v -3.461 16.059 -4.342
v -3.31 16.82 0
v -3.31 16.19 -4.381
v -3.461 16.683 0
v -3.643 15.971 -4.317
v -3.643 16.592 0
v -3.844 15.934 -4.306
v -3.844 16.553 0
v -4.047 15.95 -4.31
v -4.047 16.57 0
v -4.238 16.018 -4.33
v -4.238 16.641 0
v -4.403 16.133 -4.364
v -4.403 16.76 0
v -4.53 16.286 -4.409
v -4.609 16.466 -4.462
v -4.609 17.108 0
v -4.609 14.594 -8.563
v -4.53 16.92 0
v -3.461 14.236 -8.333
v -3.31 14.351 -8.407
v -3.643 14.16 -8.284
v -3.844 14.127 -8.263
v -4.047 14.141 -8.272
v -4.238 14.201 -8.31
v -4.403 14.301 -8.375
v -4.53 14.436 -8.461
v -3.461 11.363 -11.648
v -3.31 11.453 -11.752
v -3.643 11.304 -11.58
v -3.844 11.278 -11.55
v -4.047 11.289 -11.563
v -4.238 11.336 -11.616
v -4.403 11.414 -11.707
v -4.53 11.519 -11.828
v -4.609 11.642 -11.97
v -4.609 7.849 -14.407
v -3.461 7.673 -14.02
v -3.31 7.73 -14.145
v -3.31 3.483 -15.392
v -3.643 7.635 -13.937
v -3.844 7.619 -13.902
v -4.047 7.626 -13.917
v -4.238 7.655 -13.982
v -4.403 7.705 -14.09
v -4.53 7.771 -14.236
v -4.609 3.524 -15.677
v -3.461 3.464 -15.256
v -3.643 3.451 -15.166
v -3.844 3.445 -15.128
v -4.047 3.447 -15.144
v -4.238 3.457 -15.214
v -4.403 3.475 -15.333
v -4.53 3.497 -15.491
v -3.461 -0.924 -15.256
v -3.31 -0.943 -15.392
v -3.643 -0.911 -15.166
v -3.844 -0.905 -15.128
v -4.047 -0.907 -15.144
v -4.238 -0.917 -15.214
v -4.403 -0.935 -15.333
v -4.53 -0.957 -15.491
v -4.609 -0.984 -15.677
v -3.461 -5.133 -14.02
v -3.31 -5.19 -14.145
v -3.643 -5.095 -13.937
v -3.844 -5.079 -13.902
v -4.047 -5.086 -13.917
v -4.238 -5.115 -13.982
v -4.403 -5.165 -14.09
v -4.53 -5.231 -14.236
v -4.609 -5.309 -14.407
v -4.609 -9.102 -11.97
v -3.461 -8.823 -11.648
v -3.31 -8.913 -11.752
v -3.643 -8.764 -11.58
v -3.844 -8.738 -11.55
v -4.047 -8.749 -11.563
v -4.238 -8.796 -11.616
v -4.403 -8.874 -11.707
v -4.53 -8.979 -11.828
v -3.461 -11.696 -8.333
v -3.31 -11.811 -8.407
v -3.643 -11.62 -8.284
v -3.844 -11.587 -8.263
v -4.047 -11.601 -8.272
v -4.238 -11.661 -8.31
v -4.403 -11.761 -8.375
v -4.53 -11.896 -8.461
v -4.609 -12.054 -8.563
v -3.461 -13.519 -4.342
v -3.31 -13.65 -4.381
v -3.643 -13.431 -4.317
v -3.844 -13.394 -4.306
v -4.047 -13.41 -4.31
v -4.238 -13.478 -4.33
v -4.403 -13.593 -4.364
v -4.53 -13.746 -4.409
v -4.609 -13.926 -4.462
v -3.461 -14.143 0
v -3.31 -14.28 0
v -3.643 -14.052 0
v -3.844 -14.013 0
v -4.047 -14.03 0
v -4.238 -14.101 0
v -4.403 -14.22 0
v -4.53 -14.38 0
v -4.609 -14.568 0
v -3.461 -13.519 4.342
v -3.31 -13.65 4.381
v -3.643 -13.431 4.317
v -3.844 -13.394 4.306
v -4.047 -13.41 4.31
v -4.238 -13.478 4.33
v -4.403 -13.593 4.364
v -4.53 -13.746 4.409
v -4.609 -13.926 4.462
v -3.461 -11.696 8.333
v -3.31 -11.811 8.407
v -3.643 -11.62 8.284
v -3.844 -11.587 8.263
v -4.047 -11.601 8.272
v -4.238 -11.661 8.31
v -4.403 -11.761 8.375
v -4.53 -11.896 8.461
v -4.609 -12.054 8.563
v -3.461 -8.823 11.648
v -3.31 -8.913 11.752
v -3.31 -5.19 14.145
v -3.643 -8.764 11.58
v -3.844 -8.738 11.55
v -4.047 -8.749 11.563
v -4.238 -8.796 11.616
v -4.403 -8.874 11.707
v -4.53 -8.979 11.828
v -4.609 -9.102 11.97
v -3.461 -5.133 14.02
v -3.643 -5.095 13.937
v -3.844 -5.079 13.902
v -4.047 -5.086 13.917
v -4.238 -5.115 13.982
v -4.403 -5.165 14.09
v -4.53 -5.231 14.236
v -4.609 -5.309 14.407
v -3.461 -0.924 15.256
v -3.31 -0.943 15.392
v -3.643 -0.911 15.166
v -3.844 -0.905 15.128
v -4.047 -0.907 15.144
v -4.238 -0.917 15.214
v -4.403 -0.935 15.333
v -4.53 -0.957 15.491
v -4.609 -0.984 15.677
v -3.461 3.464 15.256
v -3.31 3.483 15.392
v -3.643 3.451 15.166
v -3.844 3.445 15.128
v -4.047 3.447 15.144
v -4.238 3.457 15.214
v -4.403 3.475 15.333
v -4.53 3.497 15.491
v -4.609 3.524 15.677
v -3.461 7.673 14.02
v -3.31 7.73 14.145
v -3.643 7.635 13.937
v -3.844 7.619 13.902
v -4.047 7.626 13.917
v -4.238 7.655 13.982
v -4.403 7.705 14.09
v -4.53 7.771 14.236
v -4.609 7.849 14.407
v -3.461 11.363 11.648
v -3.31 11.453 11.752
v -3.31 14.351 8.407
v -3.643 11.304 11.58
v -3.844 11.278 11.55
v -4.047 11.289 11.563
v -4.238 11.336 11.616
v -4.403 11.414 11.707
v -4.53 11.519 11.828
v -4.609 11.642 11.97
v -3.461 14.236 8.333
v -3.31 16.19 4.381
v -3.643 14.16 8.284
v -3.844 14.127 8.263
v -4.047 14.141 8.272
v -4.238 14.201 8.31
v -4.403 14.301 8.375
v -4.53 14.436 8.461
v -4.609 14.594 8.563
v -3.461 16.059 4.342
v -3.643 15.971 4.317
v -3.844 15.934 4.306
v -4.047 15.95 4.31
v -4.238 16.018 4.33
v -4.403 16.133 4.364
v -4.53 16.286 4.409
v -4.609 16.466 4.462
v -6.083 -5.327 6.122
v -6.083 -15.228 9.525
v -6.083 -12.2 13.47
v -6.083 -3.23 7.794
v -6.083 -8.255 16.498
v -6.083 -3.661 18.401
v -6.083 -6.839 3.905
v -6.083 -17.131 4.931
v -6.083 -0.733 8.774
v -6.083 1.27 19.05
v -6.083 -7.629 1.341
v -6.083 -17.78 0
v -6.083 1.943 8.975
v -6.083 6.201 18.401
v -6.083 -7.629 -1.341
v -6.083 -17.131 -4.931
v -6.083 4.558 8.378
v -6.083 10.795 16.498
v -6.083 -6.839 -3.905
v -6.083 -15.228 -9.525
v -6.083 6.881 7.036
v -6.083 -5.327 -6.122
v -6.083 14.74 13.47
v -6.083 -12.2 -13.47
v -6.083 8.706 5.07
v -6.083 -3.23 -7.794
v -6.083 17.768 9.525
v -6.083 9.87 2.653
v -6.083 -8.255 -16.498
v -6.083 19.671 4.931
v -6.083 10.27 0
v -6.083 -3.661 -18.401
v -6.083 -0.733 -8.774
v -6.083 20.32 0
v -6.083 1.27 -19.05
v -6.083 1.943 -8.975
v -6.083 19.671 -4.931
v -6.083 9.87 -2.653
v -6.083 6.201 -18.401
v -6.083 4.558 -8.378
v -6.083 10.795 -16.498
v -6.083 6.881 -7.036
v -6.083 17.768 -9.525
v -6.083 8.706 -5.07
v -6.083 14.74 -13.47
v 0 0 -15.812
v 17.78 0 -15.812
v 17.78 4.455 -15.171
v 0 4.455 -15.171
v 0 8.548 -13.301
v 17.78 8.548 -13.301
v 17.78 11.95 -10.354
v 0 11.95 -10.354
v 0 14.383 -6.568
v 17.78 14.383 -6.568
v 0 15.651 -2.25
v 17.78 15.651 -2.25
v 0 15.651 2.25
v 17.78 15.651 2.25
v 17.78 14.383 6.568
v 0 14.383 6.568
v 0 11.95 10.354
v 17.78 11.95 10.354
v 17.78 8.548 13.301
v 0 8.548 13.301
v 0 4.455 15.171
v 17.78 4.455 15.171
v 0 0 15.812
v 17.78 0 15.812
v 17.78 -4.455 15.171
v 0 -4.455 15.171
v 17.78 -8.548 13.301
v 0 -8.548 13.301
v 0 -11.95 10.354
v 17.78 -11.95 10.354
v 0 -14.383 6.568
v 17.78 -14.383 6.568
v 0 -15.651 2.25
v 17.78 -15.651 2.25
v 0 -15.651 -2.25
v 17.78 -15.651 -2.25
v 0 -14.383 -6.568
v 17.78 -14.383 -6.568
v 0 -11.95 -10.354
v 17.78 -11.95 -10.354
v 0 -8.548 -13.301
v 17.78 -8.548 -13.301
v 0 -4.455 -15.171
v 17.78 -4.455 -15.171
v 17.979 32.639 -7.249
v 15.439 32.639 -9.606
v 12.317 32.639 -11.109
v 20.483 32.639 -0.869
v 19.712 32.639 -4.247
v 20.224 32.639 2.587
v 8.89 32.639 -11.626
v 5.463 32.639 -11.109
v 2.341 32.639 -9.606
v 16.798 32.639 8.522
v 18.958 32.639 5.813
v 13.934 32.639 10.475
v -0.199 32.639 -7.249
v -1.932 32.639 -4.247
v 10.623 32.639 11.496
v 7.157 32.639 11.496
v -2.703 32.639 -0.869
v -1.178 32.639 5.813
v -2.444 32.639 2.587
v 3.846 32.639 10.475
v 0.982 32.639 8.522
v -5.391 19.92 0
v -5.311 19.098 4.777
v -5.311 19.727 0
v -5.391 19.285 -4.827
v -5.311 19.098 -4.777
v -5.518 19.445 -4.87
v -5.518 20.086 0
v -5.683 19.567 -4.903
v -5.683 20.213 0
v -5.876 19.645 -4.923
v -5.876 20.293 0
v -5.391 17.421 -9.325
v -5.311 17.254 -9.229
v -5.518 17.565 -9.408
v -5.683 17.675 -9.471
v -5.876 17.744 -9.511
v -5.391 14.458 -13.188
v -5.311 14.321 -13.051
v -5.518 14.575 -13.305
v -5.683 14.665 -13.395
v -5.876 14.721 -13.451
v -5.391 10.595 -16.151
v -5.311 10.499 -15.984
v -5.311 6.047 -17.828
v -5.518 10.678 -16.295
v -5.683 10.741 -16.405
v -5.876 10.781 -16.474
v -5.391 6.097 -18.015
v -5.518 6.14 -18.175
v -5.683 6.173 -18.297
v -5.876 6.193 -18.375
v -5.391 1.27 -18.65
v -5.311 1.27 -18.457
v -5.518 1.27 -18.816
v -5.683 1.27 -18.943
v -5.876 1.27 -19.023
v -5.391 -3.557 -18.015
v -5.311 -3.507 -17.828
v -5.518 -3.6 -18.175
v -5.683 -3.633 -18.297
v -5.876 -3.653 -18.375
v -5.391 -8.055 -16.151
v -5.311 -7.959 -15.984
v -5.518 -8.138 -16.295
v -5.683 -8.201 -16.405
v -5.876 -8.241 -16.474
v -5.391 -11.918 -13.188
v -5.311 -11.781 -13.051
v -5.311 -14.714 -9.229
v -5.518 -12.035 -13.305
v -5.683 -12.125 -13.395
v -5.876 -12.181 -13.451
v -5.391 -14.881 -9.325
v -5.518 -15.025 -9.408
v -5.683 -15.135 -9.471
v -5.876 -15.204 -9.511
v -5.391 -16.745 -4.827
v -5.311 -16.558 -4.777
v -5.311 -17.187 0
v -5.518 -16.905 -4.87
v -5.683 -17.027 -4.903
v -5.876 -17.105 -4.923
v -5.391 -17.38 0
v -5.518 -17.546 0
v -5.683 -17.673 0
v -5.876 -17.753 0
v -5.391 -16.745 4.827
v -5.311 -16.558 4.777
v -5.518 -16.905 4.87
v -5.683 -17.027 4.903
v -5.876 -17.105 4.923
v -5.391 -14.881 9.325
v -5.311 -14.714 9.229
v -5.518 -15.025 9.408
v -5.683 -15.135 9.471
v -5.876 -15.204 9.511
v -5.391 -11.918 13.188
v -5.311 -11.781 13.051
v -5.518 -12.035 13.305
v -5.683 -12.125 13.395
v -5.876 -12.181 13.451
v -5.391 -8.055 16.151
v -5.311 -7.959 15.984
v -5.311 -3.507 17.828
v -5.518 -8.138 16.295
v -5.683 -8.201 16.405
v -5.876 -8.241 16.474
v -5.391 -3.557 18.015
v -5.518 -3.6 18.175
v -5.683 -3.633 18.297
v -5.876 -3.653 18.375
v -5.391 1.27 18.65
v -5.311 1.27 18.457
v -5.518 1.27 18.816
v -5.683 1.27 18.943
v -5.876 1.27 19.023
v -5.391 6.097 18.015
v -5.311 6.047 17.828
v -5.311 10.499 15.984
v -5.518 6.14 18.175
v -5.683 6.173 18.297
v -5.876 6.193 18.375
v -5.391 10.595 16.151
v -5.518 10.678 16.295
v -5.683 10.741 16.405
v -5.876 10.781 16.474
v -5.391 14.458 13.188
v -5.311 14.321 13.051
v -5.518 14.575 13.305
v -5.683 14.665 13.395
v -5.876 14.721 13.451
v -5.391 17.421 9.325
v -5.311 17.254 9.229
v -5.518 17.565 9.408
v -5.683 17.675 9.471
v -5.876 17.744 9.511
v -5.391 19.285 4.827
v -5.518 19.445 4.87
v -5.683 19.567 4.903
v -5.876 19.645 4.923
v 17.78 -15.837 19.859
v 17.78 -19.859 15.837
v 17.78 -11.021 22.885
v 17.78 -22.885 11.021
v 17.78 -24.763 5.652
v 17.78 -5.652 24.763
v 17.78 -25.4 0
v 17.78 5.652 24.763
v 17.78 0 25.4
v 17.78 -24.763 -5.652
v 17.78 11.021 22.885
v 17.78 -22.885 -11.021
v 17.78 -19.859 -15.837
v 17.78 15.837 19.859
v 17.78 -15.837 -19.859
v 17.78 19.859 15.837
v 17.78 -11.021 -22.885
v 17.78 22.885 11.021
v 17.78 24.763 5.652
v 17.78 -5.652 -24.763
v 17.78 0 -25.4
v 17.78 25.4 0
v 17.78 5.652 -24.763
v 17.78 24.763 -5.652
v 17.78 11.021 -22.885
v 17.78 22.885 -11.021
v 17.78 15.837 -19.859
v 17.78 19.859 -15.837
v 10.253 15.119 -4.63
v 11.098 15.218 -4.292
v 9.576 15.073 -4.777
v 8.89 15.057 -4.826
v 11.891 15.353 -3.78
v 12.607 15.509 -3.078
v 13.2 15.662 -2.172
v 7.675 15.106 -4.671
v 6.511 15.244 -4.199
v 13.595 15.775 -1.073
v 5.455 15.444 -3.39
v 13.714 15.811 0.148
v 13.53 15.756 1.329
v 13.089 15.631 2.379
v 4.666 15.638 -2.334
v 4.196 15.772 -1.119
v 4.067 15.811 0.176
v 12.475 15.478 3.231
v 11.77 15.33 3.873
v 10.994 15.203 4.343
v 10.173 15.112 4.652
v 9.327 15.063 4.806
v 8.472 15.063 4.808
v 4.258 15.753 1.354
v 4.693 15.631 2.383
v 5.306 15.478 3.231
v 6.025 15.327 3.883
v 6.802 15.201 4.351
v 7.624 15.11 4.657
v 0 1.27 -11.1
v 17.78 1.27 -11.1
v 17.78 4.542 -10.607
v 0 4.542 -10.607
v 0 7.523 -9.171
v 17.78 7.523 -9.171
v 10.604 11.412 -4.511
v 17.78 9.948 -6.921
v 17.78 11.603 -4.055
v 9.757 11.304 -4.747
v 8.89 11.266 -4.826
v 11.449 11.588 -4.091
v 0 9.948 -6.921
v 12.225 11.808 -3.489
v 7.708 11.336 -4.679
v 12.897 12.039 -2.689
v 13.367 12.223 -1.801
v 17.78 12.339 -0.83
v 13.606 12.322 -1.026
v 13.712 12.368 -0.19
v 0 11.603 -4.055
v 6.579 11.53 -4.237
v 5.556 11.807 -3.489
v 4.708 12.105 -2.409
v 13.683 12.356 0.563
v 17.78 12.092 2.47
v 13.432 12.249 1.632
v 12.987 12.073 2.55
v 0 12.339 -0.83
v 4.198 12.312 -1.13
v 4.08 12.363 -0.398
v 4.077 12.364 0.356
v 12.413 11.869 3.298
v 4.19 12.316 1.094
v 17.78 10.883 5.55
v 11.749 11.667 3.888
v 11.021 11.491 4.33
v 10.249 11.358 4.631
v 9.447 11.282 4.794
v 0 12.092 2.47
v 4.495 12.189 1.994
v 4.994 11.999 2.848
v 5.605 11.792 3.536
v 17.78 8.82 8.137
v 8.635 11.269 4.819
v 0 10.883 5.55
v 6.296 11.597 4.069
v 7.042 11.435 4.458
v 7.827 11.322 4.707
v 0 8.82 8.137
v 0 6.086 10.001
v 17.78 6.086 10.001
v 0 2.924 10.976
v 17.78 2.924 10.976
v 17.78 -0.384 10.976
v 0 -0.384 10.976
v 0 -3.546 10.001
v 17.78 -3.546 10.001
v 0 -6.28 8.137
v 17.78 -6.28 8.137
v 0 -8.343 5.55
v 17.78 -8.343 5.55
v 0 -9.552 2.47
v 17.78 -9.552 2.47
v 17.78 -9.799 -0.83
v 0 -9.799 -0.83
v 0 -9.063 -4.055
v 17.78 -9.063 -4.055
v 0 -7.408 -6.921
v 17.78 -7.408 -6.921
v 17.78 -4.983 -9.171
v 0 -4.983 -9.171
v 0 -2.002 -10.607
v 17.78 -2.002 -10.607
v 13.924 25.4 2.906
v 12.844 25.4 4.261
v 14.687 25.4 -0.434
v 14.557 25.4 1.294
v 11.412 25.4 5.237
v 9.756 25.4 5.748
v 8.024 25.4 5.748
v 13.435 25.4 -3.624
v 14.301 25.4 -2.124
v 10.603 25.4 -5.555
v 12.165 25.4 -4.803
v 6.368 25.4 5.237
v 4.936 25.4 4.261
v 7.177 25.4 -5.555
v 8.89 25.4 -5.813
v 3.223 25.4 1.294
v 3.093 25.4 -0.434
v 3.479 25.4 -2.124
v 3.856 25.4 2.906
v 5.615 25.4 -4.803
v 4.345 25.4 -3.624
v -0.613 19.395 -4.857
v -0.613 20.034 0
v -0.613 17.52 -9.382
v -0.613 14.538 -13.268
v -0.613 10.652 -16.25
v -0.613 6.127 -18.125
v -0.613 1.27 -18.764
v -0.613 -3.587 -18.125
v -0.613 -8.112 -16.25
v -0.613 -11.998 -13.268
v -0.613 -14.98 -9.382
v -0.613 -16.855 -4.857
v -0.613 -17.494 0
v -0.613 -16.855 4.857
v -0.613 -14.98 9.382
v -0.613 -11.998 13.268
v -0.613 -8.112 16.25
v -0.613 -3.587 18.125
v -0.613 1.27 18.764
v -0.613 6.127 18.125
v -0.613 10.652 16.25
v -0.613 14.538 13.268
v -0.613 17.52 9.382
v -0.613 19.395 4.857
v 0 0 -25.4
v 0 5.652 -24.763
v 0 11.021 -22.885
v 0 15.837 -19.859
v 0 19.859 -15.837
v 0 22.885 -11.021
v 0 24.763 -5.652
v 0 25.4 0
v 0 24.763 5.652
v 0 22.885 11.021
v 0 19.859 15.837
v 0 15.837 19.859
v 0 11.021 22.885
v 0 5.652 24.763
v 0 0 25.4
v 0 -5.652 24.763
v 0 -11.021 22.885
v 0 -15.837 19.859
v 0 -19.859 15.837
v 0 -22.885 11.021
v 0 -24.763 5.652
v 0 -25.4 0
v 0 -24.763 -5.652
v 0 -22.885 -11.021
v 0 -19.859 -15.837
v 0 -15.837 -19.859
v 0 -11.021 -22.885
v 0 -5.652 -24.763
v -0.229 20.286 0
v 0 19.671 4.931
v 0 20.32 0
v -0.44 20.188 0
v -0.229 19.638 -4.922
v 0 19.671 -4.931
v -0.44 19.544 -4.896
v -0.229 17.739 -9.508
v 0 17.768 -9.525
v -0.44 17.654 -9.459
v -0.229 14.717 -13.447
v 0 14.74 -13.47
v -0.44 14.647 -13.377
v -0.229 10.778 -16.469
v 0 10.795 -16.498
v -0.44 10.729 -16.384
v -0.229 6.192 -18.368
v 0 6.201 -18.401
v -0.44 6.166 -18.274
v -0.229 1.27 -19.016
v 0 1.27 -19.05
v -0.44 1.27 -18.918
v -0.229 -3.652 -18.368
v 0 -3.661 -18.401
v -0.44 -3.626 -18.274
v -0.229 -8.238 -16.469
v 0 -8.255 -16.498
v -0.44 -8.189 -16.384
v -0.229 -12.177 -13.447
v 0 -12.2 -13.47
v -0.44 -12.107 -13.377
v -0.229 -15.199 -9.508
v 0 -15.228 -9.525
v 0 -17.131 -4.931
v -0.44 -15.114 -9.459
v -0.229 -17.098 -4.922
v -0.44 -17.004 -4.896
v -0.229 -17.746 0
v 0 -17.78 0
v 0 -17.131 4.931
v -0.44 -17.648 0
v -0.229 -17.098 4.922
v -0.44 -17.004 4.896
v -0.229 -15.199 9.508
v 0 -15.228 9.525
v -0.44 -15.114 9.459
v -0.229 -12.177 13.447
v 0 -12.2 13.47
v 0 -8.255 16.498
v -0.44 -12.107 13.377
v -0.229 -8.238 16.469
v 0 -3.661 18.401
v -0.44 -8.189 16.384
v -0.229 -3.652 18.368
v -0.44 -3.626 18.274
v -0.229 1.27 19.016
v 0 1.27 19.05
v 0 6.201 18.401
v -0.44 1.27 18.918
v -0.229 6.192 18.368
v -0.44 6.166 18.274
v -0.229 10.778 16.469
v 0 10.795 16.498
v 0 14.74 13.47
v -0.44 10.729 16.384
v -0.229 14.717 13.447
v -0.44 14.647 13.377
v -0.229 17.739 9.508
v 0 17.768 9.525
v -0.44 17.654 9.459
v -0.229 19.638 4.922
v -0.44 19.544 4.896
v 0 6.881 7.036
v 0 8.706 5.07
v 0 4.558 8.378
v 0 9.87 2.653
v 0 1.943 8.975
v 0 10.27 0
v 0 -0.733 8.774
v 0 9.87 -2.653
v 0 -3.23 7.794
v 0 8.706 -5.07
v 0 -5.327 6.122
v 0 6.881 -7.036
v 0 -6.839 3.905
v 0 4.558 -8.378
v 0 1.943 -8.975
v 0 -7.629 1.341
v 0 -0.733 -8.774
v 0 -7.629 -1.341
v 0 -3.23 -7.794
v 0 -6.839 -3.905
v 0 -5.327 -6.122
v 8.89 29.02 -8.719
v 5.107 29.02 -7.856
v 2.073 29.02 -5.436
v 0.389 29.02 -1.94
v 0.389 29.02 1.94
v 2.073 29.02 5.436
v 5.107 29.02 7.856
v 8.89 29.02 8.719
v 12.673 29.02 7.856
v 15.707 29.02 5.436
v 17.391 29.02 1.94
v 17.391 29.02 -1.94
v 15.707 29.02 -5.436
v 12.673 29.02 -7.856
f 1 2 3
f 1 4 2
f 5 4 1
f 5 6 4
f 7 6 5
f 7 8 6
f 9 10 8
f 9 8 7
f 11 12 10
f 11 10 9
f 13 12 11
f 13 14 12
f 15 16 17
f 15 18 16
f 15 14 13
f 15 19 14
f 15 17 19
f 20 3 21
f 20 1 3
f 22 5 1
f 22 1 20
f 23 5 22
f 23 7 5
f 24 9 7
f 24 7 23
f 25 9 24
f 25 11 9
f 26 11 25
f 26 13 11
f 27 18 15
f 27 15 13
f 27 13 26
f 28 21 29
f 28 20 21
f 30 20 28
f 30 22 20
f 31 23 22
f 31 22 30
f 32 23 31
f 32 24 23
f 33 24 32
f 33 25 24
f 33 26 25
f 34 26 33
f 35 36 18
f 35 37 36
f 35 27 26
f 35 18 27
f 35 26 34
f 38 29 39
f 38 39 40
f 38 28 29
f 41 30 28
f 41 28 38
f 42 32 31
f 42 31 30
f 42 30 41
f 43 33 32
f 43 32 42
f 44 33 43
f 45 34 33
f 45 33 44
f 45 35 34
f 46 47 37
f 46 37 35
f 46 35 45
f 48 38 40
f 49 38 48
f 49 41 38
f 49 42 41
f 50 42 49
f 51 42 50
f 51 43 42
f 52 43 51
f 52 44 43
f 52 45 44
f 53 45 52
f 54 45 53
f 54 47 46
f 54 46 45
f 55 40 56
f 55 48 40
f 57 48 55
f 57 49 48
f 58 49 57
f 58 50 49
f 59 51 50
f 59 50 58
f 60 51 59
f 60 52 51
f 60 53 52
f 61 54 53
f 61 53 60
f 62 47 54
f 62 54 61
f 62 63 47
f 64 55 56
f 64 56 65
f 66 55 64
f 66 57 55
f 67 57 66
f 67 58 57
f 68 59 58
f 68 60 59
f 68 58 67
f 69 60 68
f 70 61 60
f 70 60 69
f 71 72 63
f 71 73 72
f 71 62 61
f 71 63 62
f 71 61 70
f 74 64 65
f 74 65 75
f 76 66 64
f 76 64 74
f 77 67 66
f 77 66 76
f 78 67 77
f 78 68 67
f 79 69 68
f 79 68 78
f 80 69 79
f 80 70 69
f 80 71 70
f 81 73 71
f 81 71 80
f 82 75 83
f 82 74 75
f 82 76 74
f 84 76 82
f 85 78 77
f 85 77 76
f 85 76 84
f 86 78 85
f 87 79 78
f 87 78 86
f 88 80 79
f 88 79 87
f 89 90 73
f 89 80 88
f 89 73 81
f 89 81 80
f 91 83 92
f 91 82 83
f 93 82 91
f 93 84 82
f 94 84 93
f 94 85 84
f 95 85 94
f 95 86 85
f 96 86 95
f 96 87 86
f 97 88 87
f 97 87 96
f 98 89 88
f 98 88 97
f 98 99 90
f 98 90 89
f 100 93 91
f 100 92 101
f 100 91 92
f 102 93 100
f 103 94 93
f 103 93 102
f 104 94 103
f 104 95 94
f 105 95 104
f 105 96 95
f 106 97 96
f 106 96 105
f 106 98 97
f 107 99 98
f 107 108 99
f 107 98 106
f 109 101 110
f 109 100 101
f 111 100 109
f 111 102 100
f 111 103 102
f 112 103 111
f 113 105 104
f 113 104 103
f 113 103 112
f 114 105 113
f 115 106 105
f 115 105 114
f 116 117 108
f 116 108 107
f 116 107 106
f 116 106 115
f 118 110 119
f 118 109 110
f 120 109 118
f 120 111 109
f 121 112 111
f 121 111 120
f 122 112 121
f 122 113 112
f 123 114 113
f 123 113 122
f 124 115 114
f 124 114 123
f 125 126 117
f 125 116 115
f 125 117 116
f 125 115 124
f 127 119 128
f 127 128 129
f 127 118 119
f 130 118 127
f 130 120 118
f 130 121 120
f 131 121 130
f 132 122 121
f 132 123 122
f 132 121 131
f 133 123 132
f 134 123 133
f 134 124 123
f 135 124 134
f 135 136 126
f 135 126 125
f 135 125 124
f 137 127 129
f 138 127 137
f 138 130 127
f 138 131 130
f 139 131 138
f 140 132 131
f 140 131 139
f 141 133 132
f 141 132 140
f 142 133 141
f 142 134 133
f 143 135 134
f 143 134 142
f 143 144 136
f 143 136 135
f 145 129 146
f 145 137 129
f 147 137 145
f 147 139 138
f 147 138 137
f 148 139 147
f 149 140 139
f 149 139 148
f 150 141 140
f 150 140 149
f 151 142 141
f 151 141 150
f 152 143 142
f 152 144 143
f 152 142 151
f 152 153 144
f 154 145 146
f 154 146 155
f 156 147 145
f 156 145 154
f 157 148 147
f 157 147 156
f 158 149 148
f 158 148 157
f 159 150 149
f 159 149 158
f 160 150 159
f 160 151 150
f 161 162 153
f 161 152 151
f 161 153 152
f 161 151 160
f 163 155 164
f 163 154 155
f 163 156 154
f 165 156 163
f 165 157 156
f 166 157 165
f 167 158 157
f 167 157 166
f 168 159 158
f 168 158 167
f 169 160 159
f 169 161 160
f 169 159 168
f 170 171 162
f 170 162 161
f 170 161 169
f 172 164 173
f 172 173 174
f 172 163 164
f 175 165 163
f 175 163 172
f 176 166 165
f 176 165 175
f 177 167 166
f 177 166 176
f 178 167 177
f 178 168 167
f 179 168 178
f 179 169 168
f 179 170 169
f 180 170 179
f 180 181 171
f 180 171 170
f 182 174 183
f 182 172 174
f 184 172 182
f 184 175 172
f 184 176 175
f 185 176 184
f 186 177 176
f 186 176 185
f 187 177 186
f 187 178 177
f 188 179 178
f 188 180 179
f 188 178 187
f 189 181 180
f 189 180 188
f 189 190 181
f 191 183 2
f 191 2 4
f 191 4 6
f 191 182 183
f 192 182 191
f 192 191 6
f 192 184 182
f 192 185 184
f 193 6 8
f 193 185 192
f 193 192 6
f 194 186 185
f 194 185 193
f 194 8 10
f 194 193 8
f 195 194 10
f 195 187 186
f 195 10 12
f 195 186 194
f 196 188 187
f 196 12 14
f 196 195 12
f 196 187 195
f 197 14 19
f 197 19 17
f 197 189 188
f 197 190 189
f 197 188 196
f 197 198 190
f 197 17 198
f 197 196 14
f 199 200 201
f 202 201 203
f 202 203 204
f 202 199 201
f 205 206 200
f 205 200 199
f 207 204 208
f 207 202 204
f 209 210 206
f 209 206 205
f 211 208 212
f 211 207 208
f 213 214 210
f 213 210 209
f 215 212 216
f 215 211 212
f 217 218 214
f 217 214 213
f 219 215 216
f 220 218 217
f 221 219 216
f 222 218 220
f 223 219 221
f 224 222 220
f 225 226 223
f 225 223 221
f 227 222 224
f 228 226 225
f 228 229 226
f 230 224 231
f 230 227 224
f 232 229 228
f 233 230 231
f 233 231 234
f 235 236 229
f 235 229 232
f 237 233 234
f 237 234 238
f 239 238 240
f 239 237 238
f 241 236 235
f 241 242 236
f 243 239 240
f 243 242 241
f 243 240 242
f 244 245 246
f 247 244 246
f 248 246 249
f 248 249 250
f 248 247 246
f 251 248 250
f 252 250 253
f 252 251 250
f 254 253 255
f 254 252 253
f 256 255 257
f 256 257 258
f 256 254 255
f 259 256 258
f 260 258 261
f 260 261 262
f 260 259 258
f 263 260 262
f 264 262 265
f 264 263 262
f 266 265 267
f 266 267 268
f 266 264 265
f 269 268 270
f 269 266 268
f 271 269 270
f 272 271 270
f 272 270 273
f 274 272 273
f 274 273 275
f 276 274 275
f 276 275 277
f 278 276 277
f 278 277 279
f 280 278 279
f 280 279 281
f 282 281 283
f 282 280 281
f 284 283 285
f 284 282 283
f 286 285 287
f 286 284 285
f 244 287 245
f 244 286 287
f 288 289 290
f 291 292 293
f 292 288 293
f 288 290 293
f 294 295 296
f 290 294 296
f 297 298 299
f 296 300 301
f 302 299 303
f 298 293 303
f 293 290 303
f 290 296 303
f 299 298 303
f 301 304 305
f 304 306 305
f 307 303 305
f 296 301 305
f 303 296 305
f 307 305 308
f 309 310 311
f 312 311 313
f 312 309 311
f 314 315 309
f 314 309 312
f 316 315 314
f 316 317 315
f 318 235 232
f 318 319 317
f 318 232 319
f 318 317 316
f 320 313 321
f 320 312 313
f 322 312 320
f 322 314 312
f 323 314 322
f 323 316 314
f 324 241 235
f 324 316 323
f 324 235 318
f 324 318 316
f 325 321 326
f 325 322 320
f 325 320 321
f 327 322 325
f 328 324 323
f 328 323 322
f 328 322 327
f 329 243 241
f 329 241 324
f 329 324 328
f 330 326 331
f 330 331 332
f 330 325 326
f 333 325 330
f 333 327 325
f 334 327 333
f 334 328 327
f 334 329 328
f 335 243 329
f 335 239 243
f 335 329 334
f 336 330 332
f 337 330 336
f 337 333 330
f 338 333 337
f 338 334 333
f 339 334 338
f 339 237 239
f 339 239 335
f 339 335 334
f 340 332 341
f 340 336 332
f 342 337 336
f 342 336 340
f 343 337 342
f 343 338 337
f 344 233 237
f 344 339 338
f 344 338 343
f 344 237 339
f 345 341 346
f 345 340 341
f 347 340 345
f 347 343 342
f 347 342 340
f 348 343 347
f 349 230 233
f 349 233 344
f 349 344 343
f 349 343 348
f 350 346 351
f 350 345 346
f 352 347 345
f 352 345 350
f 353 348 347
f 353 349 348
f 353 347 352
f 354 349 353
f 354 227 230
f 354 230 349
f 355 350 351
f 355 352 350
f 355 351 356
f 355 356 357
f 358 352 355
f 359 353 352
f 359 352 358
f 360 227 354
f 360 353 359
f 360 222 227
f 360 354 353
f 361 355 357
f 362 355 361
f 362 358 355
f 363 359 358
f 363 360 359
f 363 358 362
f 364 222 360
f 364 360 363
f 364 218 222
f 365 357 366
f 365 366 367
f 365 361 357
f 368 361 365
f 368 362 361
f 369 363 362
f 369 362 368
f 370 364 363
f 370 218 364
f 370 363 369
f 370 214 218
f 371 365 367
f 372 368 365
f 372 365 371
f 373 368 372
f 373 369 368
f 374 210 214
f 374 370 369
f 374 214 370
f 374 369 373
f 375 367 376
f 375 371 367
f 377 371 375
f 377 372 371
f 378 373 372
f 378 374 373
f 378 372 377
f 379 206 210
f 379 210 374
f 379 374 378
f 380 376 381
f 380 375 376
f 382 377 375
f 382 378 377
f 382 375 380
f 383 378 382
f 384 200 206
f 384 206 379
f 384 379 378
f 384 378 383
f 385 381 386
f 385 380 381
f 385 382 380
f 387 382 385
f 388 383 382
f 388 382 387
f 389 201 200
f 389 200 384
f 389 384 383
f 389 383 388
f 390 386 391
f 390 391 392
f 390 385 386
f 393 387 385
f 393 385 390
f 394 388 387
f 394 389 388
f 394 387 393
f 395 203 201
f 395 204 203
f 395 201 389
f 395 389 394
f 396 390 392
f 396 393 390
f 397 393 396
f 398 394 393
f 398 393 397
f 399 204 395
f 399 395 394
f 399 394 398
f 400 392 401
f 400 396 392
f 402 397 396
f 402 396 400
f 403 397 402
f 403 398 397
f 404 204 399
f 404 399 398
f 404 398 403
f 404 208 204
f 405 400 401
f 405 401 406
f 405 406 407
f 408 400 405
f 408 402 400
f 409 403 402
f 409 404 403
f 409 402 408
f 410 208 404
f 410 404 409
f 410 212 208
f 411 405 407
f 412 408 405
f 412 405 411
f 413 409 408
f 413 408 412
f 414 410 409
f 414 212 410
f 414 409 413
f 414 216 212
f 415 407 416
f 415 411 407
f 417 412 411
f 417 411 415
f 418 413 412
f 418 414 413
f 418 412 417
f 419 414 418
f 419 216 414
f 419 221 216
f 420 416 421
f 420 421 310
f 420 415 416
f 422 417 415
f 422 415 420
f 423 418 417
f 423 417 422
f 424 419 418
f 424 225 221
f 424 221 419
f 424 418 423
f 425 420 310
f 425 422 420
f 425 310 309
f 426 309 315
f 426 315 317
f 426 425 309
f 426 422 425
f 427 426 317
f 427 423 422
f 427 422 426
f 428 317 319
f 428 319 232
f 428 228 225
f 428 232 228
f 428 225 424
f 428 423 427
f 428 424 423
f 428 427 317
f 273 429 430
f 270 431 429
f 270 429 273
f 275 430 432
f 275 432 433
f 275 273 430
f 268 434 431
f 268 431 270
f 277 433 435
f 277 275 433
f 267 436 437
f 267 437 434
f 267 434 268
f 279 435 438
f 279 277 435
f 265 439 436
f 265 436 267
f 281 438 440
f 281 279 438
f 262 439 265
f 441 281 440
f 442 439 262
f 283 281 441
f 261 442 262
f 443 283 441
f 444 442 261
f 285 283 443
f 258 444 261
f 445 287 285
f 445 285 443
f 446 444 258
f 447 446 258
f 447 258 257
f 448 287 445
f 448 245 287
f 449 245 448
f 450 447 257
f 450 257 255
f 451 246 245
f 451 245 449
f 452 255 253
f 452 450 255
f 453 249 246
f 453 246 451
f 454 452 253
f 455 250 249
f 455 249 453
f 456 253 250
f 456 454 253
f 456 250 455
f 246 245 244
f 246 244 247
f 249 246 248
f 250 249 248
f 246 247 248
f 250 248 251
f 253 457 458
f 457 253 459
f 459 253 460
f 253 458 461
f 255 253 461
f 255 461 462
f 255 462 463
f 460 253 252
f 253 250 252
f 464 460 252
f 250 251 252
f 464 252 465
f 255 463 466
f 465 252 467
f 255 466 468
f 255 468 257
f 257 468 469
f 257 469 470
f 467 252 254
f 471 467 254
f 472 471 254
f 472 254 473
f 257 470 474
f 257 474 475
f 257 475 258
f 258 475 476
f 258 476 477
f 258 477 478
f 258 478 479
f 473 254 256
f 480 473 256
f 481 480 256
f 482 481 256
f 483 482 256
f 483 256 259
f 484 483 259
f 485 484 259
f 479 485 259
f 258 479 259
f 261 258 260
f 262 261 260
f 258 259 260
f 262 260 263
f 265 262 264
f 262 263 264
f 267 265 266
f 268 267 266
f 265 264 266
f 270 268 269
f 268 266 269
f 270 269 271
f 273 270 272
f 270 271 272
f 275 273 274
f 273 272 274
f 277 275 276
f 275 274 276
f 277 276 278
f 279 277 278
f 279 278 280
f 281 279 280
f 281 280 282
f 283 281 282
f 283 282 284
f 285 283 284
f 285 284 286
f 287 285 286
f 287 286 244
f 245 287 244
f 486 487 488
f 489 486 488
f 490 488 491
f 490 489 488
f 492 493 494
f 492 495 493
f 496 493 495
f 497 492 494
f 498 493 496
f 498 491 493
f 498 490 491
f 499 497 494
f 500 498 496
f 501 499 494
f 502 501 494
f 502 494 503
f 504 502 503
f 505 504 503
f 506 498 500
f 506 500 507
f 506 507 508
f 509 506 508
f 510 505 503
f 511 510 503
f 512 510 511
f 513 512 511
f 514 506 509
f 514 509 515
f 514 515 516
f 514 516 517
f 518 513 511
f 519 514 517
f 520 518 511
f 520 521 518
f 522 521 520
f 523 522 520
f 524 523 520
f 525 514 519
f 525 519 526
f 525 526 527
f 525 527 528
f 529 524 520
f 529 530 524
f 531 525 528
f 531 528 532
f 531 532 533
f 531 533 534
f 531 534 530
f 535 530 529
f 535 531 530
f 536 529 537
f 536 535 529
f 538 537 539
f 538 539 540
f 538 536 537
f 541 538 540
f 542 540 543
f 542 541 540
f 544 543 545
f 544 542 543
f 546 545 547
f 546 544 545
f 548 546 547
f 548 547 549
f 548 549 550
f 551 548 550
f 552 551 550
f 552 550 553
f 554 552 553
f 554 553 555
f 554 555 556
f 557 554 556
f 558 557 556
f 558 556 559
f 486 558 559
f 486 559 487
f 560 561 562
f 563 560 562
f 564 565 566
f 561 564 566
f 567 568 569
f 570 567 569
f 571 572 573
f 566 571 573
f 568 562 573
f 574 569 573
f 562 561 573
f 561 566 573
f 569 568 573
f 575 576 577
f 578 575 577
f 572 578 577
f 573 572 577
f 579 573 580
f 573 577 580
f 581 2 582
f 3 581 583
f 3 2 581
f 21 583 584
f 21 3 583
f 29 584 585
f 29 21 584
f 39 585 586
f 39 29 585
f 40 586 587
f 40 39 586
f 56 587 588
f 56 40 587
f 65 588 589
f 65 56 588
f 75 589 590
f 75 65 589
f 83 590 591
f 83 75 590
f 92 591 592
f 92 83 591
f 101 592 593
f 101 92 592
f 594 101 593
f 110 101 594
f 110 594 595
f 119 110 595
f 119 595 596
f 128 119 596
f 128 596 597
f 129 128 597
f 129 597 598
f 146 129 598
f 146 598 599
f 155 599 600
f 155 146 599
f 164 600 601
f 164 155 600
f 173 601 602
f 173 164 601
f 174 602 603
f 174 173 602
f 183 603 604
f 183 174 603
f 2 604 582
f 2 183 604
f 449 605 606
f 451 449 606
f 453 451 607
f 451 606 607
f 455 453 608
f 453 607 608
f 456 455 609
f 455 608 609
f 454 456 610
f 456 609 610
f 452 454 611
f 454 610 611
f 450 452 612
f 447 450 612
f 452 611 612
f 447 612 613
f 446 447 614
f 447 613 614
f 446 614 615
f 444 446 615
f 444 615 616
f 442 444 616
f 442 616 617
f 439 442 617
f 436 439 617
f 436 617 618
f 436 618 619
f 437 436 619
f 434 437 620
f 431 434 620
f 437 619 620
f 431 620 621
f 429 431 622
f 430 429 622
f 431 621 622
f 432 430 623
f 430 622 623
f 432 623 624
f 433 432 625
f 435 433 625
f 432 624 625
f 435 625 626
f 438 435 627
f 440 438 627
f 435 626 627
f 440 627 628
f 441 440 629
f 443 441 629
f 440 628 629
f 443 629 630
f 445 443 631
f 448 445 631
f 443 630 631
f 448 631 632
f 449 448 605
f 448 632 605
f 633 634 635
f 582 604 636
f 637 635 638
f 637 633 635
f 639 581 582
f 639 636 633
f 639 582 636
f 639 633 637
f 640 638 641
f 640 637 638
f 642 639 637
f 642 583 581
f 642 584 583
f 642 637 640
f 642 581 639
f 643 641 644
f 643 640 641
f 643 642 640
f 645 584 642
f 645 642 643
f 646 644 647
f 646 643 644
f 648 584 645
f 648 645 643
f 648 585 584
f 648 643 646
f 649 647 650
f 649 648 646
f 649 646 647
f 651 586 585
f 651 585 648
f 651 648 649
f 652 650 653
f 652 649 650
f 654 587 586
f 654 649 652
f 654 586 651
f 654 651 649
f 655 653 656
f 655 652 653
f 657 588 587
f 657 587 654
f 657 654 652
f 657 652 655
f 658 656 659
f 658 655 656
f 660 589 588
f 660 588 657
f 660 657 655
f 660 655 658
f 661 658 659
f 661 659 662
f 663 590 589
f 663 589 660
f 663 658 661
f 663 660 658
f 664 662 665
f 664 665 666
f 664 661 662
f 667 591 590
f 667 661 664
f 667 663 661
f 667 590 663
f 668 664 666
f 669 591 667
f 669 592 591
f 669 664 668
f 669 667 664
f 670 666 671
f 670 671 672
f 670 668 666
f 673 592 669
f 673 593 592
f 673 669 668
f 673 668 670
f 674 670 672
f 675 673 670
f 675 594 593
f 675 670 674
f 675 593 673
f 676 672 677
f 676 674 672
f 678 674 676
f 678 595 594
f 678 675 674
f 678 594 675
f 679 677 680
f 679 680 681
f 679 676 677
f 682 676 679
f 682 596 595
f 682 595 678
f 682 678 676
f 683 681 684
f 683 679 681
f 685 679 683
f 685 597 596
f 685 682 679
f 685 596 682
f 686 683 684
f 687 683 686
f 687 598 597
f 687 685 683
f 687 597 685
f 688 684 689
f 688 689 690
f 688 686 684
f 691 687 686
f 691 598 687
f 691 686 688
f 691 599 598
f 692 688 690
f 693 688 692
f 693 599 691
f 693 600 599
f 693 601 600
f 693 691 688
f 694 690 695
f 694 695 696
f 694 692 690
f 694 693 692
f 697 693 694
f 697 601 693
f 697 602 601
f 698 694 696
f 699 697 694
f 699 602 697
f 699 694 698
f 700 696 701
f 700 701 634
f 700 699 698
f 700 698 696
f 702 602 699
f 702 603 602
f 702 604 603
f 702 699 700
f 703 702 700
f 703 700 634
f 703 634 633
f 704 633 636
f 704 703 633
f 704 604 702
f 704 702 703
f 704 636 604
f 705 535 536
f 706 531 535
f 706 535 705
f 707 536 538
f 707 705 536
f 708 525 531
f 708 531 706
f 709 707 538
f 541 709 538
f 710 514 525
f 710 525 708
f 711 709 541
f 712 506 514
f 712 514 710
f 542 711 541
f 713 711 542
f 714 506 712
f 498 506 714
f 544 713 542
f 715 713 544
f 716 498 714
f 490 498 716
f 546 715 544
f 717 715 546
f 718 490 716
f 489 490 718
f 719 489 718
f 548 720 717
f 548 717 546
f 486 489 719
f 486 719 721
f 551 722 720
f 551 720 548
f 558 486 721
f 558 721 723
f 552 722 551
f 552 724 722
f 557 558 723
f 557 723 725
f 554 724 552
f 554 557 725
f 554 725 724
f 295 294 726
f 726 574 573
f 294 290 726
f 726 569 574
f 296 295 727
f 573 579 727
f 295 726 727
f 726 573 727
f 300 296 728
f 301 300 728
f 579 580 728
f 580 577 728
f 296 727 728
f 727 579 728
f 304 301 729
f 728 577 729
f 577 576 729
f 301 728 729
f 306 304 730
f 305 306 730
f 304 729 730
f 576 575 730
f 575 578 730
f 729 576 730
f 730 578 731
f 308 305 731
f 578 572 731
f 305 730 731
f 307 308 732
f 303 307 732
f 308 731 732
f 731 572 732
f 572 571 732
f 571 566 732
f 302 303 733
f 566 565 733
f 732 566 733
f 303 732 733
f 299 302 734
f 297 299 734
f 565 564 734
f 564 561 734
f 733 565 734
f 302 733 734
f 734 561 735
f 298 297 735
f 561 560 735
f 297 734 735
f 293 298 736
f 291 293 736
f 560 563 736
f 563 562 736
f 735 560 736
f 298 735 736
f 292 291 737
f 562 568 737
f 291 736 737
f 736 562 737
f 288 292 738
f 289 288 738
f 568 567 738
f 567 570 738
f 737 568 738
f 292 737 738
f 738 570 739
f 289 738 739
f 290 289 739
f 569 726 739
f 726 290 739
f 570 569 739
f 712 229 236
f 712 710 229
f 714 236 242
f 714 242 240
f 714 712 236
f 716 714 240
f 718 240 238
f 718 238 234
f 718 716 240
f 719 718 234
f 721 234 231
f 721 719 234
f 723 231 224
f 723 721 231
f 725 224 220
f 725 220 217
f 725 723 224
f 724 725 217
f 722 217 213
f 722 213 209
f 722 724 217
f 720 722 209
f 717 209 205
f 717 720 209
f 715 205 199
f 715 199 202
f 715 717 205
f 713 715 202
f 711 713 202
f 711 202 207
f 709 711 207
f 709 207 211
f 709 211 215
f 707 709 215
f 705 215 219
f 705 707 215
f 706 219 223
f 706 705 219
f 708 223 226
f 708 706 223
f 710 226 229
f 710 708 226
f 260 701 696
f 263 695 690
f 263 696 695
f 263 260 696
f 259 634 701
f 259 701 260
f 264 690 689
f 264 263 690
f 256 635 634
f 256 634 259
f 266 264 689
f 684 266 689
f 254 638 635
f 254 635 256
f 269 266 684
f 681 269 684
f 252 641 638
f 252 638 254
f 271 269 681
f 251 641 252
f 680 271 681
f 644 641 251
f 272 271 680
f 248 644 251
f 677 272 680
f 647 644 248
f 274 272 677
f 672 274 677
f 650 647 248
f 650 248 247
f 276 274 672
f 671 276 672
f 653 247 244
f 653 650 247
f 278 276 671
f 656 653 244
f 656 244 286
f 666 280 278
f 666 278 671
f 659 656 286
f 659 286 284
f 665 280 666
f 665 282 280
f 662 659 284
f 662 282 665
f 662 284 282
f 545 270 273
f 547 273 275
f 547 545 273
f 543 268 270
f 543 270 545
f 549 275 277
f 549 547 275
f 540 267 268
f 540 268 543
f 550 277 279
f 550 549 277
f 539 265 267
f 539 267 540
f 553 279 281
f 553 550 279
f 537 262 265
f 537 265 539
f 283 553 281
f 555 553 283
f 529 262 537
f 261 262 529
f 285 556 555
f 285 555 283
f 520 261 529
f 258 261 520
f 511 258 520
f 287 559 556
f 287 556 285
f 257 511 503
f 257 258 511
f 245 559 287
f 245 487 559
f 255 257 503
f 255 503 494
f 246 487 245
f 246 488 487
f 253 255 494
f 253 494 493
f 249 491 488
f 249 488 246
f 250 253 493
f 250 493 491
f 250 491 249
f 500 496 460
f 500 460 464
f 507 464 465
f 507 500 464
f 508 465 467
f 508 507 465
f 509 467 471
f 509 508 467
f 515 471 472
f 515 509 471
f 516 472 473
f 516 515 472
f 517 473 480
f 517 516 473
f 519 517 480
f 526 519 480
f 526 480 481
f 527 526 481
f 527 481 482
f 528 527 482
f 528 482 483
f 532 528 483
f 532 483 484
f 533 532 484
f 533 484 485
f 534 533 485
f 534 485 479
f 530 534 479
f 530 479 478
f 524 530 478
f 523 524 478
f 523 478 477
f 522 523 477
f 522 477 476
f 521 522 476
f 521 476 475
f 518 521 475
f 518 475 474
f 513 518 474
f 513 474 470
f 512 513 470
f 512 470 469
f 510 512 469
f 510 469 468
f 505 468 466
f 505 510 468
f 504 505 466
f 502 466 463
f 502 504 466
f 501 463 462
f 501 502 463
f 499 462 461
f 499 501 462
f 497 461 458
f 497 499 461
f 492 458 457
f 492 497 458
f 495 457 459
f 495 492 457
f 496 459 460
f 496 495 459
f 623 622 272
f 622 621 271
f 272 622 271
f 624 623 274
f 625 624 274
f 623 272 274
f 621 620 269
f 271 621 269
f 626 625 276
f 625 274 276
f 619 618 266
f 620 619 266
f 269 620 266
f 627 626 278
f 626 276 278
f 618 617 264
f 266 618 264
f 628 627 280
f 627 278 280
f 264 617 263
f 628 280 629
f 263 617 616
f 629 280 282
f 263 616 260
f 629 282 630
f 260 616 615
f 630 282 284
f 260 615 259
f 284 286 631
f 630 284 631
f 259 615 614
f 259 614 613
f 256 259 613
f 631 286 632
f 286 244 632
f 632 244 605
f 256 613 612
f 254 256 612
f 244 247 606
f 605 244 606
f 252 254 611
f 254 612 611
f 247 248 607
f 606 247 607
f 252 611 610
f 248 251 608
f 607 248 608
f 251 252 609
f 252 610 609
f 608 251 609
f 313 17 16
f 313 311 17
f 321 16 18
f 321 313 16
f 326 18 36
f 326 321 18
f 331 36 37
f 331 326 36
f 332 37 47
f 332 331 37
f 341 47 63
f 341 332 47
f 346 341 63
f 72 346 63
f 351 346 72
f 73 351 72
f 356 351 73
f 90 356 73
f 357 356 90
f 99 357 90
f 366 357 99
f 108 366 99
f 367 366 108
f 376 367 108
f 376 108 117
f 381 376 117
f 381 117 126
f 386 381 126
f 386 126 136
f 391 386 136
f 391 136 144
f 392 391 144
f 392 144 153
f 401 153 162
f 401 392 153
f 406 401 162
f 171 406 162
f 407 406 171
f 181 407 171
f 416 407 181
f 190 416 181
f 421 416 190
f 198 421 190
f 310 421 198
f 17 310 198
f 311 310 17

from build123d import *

# Parameters (mm, degrees)
SKETCH2_R           = 15.8115
SKETCH2_R_2         = 11.1
BOSS_EXTRUDE1_DEPTH = 17.78
SKETCH4_R           = 4.826
CUT_EXTRUDE1_DEPTH  = 17.78
SKETCH5_R           = 25.4
SKETCH5_R_2         = 15.8115
BOSS_EXTRUDE2_DEPTH = 17.78


with BuildPart() as part:
    # Sketch2 → Boss-Extrude1 (new body)
    with BuildSketch(Plane(origin=(0, 0, 0), x_dir=(0, 0, -1), z_dir=(1, 0, 0))):
        Circle(SKETCH2_R)
        with Locations((0, 1.27)):
            Circle(SKETCH2_R_2, mode=Mode.SUBTRACT)
    extrude(amount=BOSS_EXTRUDE1_DEPTH)

    # Sketch3 → Revolve1 (revolve)
    with BuildSketch(Plane.XY):
        with BuildLine():
            Line((0, 10.27), (0, 20.32))
            ThreePointArc((0, 20.32), (-0.338094609, 20.24504623), (-0.612835554, 20.034230088))
            Line((-0.612835554, 20.034230088), (-3.309894836, 16.82))
            ThreePointArc((-3.309894836, 16.82), (-4.046757878, 16.569868702), (-4.608872538, 17.107976423))
            Line((-4.608872538, 17.107976423), (-5.31065259, 19.727055236))
            ThreePointArc((-5.31065259, 19.727055236), (-5.596384108, 20.154682672), (-6.083393251, 20.32))
            Line((-6.083393251, 20.32), (-6.083393251, 10.27))
            Line((-6.083393251, 10.27), (0, 10.27))
        make_face()
    revolve(axis=Axis((8.89, 1.27, 0), (-1, 0, 0)))

    # Sketch4 → Cut-Extrude1 (cut)
    with BuildSketch(Plane(origin=(0, 0, 0), x_dir=(1, 0, 0), z_dir=(0, 1, 0))):
        with Locations(Location((8.89, 0, 0), (0, 0, 90))):
            Circle(SKETCH4_R)
    extrude(amount=CUT_EXTRUDE1_DEPTH, mode=Mode.SUBTRACT)


with BuildPart() as body_2:
    # Sketch5 → Boss-Extrude2 (new body)
    with BuildSketch(Plane(origin=(0, 0, 0), x_dir=(0, 0, -1), z_dir=(1, 0, 0))):
        Circle(SKETCH5_R)
        Circle(SKETCH5_R_2, mode=Mode.SUBTRACT)
    extrude(amount=BOSS_EXTRUDE2_DEPTH)


with BuildPart() as body_3:
    # Sketch6 → Revolve2 (revolve)
    with BuildSketch(Plane.XY, mode=Mode.PRIVATE) as revolve2_sk:
        Polygon((8.89, 25.4), (8.89, 32.639), (20.515876198, 32.639), (14.702938099, 25.4), align=None)
    revolve(revolve2_sk.sketch.rotate(Axis((8.89, 25.4, 0), (0, 1, 0)), 90), axis=Axis((8.89, 25.4, 0), (0, 1, 0)))


solid = Compound([part.part, body_2.part, body_3.part])
